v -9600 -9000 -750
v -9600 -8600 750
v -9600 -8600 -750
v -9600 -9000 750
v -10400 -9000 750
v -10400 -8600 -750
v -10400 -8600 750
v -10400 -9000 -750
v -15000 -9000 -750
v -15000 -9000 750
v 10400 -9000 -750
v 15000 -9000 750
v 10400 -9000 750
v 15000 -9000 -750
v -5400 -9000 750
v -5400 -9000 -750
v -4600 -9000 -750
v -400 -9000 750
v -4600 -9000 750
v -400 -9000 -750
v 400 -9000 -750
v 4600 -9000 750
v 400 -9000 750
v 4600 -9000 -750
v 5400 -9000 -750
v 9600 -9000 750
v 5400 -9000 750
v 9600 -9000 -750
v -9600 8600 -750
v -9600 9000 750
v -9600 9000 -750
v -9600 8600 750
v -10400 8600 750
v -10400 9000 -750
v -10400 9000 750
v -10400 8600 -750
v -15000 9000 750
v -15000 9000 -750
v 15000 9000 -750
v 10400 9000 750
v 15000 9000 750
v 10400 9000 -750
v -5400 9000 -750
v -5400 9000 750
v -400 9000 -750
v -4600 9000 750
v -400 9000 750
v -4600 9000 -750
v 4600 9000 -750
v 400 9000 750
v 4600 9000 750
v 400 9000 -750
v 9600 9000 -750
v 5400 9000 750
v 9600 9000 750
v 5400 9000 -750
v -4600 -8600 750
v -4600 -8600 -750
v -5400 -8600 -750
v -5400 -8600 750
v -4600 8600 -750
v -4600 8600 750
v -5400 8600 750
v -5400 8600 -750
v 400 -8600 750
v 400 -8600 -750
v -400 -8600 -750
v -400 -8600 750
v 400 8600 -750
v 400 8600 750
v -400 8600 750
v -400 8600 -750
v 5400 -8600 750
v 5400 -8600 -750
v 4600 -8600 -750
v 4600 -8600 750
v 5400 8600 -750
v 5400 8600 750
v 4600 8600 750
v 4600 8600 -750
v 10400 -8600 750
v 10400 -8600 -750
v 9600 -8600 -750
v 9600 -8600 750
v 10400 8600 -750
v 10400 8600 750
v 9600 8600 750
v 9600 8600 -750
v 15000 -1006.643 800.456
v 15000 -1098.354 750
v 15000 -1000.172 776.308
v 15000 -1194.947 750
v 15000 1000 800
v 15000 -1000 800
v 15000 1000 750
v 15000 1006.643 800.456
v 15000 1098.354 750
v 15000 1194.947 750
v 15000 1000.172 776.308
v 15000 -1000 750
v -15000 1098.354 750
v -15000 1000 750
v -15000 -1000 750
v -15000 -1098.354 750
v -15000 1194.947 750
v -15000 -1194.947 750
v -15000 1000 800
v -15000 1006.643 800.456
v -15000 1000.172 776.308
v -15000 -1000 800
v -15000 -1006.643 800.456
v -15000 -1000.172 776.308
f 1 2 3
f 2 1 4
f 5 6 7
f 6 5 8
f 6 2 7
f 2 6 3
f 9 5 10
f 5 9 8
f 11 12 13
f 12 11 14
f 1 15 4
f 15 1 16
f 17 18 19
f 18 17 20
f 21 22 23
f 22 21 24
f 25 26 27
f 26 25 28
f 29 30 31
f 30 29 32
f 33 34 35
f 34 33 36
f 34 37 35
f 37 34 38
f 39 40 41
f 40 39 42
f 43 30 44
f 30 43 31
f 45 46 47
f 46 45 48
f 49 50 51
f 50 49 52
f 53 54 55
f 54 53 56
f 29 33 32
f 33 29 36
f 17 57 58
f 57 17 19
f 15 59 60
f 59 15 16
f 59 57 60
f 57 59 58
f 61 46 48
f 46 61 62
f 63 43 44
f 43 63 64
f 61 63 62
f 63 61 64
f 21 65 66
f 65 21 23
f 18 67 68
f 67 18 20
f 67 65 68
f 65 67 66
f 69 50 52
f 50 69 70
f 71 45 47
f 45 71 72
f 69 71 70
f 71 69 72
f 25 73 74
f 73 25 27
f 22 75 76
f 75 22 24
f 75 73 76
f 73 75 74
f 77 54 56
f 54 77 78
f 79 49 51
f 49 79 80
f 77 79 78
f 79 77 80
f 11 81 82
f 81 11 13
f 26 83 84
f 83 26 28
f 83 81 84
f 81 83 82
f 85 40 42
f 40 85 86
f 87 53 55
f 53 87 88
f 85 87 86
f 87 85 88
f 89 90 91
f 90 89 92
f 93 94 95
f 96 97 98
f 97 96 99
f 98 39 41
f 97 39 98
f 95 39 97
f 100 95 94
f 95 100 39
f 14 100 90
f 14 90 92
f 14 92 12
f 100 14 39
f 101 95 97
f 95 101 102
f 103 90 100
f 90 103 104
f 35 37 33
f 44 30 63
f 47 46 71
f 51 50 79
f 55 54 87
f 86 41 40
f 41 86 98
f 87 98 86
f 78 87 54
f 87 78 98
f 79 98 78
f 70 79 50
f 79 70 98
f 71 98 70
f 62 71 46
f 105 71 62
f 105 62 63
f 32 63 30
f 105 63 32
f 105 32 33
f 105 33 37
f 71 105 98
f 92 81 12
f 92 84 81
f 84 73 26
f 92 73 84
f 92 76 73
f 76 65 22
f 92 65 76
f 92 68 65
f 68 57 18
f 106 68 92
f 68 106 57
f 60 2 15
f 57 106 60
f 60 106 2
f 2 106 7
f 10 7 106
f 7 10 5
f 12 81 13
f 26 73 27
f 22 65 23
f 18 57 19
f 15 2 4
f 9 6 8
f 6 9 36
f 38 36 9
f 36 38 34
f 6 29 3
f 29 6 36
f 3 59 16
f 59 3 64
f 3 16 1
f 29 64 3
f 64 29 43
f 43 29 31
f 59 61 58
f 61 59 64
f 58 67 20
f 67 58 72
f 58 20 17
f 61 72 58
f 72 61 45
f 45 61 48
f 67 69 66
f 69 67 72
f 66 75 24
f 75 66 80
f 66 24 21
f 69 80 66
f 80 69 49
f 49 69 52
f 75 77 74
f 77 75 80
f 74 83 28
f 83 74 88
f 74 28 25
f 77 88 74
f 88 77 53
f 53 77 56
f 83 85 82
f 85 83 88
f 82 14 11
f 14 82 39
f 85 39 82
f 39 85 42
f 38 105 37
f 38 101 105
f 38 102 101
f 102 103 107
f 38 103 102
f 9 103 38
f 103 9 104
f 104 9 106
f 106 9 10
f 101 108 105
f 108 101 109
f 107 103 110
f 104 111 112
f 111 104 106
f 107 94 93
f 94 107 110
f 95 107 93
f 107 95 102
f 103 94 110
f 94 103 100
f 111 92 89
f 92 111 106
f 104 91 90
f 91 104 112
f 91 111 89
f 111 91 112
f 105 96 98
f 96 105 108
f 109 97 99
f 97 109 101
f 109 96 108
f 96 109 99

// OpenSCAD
// =========================================================================
// GRUMMAN-STYLED INFLATABLE CARRIER - SURFACE-MOUNT EDDY-TAPE PROFILE
// MANUFACTURER: HUNTINGTON INGALLS / NEWPORT NEWS SHIPBUILDING
// MATERIAL PROFILE: GRADE 5 TITANIUM SHIELDED SURFACE ARRANGEMENT
// =========================================================================

module surface_mount_eddy_tape(strip_length=30000, tape_width=2000, total_thickness=50) {
    union() {
        // Core Induction Layer (Active Eddy-Tape Core Engine)
        translate([0, 0, total_thickness/2])
            cube([strip_length, tape_width, total_thickness], center=true);
            
        // Left Tapered Transition Safety Ramp (15-Degree Clearance Slope)
        translate([0, -tape_width/2 - 100, total_thickness/4])
            rotate([15, 0, 0])
                cube([strip_length, 200, total_thickness/2], center=true);
                
        // Right Tapered Transition Safety Ramp (15-Degree Clearance Slope)
        translate([0, tape_width/2 + 100, total_thickness/4])
            rotate([-15, 0, 0])
                cube([strip_length, 200, total_thickness/2], center=true);
    }
}

module non_recessed_flight_deck(length=30000, width=18000, thickness=1500) {
    difference() {
        // Solid Flatbed Deck Base
        cube([length, width, thickness], center=true);
        
        // Passive Edge Drainage Scuppers (Retained for Water Management)
        for (x_offset = [-length/3 : length/6 : length/3]) {
            translate([x_offset, -width/2 + 200, 0]) cube([800, 400, thickness + 20], center=true);
            translate([x_offset, width/2 - 200, 0])  cube([800, 400, thickness + 20], center=true);
        }
    }
    
    // Apply Maglev Tape directly onto the raw horizontal surface plane
    translate([0, 0, thickness/2])
        surface_mount_eddy_tape();
}

// Render complete un-recessed plate array
non_recessed_flight_deck();
